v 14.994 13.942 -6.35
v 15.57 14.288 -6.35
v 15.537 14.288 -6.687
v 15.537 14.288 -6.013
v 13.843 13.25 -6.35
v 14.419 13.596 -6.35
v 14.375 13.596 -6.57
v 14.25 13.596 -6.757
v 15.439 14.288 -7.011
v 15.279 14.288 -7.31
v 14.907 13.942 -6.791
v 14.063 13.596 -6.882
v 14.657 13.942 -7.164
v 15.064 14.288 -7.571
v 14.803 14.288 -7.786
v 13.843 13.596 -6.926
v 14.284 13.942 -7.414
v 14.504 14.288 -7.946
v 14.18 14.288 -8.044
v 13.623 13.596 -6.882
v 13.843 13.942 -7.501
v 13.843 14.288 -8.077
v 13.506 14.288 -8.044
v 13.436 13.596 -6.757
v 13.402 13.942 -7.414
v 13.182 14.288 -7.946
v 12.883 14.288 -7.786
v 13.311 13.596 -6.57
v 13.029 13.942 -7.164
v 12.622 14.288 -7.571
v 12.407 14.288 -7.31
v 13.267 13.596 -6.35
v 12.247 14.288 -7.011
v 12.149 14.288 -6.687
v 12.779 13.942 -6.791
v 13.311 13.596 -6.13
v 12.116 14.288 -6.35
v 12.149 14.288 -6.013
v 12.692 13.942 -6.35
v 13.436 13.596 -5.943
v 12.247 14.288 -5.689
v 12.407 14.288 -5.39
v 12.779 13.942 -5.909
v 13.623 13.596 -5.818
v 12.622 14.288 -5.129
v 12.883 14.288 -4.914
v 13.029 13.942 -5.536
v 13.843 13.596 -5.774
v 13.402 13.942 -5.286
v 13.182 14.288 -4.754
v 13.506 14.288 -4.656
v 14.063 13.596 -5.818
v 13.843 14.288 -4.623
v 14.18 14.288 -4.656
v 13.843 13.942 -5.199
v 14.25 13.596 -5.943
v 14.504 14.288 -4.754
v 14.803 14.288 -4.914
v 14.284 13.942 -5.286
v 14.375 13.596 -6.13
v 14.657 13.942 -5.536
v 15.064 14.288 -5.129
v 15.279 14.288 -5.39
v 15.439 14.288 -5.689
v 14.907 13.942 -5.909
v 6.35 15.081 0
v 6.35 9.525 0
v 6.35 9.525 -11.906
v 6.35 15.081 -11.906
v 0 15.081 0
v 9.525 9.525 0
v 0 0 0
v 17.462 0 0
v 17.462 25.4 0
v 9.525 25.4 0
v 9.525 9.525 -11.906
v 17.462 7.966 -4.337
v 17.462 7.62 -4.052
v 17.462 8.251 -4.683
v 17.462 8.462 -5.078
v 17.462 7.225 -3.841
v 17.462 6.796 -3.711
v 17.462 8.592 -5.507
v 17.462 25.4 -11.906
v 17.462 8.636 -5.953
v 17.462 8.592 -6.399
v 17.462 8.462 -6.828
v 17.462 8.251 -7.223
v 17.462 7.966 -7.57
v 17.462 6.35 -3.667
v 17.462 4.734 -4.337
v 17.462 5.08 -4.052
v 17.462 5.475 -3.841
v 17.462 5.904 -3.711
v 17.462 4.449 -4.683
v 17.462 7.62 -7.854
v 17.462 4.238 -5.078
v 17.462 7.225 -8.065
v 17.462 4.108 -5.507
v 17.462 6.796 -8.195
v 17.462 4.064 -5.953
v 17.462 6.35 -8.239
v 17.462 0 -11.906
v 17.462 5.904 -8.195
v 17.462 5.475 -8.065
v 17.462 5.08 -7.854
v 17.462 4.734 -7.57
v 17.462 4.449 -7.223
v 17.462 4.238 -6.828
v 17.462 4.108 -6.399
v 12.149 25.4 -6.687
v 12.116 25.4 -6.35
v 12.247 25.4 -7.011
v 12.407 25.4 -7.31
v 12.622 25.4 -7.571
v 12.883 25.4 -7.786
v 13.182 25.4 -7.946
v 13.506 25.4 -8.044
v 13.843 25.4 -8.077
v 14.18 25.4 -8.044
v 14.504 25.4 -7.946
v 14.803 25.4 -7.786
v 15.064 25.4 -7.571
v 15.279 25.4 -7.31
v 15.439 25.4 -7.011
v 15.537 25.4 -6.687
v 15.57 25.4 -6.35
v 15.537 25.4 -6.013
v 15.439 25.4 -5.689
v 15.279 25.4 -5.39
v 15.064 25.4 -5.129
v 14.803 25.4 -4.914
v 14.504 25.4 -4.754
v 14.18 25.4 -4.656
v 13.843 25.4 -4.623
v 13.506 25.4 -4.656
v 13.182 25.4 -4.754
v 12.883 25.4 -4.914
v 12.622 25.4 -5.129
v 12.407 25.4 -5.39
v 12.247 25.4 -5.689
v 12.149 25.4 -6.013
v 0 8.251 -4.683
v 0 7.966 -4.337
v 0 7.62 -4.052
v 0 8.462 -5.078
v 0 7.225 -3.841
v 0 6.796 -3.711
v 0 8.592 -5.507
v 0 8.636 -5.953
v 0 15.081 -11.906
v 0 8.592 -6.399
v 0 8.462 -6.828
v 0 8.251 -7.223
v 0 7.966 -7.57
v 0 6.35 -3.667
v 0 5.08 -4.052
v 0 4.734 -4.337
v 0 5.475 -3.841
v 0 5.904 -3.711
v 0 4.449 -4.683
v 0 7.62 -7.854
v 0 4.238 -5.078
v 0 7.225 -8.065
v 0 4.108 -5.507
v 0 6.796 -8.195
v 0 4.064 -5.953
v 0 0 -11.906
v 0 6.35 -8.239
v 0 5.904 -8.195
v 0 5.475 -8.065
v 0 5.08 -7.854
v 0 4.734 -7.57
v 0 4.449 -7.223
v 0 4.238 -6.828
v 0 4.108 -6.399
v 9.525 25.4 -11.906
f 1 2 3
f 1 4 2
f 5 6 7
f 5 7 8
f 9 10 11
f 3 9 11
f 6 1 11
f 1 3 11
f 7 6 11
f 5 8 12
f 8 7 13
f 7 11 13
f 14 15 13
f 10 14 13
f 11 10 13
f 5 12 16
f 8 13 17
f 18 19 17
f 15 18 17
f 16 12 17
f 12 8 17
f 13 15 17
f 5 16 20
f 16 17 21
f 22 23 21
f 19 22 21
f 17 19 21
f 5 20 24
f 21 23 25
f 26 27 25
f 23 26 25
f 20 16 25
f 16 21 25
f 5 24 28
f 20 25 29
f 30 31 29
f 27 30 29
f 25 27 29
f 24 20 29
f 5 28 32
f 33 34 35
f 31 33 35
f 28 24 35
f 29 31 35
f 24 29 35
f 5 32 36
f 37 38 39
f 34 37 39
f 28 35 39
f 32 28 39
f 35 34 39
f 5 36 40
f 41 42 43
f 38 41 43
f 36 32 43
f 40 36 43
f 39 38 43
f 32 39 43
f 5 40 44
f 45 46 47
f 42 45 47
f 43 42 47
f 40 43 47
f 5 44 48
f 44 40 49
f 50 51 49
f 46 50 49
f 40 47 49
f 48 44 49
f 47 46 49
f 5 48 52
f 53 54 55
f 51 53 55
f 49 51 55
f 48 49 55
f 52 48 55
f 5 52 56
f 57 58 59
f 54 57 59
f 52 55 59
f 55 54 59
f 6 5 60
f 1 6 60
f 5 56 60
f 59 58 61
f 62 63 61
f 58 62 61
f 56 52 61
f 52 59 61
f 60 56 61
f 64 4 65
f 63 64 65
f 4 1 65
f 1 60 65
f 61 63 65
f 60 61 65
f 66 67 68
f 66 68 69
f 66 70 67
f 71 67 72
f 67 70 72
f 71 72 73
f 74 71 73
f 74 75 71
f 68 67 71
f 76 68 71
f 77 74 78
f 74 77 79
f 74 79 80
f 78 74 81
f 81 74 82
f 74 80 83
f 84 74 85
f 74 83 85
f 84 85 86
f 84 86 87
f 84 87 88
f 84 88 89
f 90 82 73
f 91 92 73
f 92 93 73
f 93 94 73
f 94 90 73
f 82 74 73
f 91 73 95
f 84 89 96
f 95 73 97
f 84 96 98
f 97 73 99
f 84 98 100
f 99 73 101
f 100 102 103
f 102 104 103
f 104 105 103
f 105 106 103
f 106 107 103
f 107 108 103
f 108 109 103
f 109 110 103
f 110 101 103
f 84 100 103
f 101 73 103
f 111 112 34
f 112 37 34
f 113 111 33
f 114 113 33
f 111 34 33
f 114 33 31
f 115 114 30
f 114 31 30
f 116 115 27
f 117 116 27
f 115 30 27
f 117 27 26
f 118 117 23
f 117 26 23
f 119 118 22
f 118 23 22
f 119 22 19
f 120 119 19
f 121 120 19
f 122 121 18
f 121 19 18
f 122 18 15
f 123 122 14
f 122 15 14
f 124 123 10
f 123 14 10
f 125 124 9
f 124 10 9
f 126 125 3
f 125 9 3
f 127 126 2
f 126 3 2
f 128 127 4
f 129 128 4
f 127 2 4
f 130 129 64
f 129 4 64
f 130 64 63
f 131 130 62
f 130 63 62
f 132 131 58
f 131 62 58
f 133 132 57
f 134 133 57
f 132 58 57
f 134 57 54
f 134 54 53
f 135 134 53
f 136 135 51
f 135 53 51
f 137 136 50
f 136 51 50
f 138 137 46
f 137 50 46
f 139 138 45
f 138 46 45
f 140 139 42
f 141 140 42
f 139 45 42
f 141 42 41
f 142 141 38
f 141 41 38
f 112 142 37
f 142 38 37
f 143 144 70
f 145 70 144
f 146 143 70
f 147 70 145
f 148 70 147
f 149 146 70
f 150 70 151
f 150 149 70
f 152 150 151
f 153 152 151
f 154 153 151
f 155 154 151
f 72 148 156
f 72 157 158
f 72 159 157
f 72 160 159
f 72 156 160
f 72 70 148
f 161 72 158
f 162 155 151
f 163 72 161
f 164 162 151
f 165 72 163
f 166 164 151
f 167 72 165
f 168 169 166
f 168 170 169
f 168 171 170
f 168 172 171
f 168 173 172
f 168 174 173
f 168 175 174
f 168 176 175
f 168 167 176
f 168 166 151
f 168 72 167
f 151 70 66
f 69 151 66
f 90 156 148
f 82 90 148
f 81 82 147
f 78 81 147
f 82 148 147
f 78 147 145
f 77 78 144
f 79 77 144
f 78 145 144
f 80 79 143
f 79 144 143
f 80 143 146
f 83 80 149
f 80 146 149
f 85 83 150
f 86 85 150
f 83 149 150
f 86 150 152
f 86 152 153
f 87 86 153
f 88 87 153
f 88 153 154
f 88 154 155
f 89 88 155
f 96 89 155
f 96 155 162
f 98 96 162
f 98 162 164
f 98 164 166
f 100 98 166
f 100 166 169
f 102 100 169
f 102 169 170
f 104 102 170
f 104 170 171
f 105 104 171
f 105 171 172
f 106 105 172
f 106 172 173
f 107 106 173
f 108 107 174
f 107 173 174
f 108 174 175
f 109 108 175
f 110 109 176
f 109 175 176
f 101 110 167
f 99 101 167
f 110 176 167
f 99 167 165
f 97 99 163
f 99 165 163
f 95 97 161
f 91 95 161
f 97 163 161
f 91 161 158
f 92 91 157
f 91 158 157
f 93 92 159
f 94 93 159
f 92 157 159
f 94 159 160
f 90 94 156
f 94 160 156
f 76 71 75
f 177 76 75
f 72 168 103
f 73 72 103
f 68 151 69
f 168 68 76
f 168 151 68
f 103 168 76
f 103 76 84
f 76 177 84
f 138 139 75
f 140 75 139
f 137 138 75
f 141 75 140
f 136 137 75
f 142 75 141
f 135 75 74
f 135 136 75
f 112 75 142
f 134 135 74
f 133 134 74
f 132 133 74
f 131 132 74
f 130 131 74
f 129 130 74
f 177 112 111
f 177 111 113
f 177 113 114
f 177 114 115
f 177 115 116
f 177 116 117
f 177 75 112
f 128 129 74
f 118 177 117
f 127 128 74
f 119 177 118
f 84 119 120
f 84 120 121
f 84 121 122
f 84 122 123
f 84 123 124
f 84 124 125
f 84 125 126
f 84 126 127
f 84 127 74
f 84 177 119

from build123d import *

# Parameters (mm, degrees)
SKETCH1_W                 = 17.4625
SKETCH1_H                 = 11.90625
BOSS_EXTRUDE1_DEPTH       = 25.4
SKETCH2_W                 = 3.175
SKETCH2_H                 = 5.55625
CUT_EXTRUDE1_DEPTH        = 25.4
SKETCH4_R                 = 2.286
CUT_EXTRUDE2_DEPTH        = 25.4
F_8_32_TAPPED_HOLE1_D     = 3.4544
F_8_32_TAPPED_HOLE1_DEPTH = 11.1125
F_8_32_TAPPED_HOLE1_TIP   = 1.037806461


with BuildPart() as part:
    # Sketch1 → Boss-Extrude1 (new body)
    with BuildSketch(Plane(origin=(0, 0, 0), x_dir=(1, 0, 0), z_dir=(0, 1, 0))):
        with Locations((8.73125, 5.953125)):
            Rectangle(SKETCH1_W, SKETCH1_H)
    extrude(amount=BOSS_EXTRUDE1_DEPTH)

    # Sketch2 → Cut-Extrude1 (cut)
    with BuildSketch(Plane.XY):
        Polygon((0, 15.08125), (6.35, 15.08125), (9.525, 15.08125), (9.525, 25.4), (0, 25.4), align=None)
        with Locations((7.9375, 12.303125)):
            Rectangle(SKETCH2_W, SKETCH2_H)
    extrude(amount=-CUT_EXTRUDE1_DEPTH, mode=Mode.SUBTRACT)

    # Sketch4 → Cut-Extrude2 (cut)
    with BuildSketch(Plane.ZY):
        with Locations((-5.953125, 6.35)):
            Circle(SKETCH4_R)
    extrude(amount=-CUT_EXTRUDE2_DEPTH, mode=Mode.SUBTRACT)

    # #8-32 Tapped Hole1
    with Locations(Plane(origin=(0, 25.4, 0), x_dir=(1, 0, 0), z_dir=(0, 1, 0))):
        with Locations((13.843, 6.35)):
            Hole(F_8_32_TAPPED_HOLE1_D / 2, depth=F_8_32_TAPPED_HOLE1_DEPTH)
            with Locations((0, 0, -(F_8_32_TAPPED_HOLE1_DEPTH + F_8_32_TAPPED_HOLE1_TIP / 2))):  # 118° drill point
                Cone(0, F_8_32_TAPPED_HOLE1_D / 2, F_8_32_TAPPED_HOLE1_TIP, mode=Mode.SUBTRACT)


solid = part.part
